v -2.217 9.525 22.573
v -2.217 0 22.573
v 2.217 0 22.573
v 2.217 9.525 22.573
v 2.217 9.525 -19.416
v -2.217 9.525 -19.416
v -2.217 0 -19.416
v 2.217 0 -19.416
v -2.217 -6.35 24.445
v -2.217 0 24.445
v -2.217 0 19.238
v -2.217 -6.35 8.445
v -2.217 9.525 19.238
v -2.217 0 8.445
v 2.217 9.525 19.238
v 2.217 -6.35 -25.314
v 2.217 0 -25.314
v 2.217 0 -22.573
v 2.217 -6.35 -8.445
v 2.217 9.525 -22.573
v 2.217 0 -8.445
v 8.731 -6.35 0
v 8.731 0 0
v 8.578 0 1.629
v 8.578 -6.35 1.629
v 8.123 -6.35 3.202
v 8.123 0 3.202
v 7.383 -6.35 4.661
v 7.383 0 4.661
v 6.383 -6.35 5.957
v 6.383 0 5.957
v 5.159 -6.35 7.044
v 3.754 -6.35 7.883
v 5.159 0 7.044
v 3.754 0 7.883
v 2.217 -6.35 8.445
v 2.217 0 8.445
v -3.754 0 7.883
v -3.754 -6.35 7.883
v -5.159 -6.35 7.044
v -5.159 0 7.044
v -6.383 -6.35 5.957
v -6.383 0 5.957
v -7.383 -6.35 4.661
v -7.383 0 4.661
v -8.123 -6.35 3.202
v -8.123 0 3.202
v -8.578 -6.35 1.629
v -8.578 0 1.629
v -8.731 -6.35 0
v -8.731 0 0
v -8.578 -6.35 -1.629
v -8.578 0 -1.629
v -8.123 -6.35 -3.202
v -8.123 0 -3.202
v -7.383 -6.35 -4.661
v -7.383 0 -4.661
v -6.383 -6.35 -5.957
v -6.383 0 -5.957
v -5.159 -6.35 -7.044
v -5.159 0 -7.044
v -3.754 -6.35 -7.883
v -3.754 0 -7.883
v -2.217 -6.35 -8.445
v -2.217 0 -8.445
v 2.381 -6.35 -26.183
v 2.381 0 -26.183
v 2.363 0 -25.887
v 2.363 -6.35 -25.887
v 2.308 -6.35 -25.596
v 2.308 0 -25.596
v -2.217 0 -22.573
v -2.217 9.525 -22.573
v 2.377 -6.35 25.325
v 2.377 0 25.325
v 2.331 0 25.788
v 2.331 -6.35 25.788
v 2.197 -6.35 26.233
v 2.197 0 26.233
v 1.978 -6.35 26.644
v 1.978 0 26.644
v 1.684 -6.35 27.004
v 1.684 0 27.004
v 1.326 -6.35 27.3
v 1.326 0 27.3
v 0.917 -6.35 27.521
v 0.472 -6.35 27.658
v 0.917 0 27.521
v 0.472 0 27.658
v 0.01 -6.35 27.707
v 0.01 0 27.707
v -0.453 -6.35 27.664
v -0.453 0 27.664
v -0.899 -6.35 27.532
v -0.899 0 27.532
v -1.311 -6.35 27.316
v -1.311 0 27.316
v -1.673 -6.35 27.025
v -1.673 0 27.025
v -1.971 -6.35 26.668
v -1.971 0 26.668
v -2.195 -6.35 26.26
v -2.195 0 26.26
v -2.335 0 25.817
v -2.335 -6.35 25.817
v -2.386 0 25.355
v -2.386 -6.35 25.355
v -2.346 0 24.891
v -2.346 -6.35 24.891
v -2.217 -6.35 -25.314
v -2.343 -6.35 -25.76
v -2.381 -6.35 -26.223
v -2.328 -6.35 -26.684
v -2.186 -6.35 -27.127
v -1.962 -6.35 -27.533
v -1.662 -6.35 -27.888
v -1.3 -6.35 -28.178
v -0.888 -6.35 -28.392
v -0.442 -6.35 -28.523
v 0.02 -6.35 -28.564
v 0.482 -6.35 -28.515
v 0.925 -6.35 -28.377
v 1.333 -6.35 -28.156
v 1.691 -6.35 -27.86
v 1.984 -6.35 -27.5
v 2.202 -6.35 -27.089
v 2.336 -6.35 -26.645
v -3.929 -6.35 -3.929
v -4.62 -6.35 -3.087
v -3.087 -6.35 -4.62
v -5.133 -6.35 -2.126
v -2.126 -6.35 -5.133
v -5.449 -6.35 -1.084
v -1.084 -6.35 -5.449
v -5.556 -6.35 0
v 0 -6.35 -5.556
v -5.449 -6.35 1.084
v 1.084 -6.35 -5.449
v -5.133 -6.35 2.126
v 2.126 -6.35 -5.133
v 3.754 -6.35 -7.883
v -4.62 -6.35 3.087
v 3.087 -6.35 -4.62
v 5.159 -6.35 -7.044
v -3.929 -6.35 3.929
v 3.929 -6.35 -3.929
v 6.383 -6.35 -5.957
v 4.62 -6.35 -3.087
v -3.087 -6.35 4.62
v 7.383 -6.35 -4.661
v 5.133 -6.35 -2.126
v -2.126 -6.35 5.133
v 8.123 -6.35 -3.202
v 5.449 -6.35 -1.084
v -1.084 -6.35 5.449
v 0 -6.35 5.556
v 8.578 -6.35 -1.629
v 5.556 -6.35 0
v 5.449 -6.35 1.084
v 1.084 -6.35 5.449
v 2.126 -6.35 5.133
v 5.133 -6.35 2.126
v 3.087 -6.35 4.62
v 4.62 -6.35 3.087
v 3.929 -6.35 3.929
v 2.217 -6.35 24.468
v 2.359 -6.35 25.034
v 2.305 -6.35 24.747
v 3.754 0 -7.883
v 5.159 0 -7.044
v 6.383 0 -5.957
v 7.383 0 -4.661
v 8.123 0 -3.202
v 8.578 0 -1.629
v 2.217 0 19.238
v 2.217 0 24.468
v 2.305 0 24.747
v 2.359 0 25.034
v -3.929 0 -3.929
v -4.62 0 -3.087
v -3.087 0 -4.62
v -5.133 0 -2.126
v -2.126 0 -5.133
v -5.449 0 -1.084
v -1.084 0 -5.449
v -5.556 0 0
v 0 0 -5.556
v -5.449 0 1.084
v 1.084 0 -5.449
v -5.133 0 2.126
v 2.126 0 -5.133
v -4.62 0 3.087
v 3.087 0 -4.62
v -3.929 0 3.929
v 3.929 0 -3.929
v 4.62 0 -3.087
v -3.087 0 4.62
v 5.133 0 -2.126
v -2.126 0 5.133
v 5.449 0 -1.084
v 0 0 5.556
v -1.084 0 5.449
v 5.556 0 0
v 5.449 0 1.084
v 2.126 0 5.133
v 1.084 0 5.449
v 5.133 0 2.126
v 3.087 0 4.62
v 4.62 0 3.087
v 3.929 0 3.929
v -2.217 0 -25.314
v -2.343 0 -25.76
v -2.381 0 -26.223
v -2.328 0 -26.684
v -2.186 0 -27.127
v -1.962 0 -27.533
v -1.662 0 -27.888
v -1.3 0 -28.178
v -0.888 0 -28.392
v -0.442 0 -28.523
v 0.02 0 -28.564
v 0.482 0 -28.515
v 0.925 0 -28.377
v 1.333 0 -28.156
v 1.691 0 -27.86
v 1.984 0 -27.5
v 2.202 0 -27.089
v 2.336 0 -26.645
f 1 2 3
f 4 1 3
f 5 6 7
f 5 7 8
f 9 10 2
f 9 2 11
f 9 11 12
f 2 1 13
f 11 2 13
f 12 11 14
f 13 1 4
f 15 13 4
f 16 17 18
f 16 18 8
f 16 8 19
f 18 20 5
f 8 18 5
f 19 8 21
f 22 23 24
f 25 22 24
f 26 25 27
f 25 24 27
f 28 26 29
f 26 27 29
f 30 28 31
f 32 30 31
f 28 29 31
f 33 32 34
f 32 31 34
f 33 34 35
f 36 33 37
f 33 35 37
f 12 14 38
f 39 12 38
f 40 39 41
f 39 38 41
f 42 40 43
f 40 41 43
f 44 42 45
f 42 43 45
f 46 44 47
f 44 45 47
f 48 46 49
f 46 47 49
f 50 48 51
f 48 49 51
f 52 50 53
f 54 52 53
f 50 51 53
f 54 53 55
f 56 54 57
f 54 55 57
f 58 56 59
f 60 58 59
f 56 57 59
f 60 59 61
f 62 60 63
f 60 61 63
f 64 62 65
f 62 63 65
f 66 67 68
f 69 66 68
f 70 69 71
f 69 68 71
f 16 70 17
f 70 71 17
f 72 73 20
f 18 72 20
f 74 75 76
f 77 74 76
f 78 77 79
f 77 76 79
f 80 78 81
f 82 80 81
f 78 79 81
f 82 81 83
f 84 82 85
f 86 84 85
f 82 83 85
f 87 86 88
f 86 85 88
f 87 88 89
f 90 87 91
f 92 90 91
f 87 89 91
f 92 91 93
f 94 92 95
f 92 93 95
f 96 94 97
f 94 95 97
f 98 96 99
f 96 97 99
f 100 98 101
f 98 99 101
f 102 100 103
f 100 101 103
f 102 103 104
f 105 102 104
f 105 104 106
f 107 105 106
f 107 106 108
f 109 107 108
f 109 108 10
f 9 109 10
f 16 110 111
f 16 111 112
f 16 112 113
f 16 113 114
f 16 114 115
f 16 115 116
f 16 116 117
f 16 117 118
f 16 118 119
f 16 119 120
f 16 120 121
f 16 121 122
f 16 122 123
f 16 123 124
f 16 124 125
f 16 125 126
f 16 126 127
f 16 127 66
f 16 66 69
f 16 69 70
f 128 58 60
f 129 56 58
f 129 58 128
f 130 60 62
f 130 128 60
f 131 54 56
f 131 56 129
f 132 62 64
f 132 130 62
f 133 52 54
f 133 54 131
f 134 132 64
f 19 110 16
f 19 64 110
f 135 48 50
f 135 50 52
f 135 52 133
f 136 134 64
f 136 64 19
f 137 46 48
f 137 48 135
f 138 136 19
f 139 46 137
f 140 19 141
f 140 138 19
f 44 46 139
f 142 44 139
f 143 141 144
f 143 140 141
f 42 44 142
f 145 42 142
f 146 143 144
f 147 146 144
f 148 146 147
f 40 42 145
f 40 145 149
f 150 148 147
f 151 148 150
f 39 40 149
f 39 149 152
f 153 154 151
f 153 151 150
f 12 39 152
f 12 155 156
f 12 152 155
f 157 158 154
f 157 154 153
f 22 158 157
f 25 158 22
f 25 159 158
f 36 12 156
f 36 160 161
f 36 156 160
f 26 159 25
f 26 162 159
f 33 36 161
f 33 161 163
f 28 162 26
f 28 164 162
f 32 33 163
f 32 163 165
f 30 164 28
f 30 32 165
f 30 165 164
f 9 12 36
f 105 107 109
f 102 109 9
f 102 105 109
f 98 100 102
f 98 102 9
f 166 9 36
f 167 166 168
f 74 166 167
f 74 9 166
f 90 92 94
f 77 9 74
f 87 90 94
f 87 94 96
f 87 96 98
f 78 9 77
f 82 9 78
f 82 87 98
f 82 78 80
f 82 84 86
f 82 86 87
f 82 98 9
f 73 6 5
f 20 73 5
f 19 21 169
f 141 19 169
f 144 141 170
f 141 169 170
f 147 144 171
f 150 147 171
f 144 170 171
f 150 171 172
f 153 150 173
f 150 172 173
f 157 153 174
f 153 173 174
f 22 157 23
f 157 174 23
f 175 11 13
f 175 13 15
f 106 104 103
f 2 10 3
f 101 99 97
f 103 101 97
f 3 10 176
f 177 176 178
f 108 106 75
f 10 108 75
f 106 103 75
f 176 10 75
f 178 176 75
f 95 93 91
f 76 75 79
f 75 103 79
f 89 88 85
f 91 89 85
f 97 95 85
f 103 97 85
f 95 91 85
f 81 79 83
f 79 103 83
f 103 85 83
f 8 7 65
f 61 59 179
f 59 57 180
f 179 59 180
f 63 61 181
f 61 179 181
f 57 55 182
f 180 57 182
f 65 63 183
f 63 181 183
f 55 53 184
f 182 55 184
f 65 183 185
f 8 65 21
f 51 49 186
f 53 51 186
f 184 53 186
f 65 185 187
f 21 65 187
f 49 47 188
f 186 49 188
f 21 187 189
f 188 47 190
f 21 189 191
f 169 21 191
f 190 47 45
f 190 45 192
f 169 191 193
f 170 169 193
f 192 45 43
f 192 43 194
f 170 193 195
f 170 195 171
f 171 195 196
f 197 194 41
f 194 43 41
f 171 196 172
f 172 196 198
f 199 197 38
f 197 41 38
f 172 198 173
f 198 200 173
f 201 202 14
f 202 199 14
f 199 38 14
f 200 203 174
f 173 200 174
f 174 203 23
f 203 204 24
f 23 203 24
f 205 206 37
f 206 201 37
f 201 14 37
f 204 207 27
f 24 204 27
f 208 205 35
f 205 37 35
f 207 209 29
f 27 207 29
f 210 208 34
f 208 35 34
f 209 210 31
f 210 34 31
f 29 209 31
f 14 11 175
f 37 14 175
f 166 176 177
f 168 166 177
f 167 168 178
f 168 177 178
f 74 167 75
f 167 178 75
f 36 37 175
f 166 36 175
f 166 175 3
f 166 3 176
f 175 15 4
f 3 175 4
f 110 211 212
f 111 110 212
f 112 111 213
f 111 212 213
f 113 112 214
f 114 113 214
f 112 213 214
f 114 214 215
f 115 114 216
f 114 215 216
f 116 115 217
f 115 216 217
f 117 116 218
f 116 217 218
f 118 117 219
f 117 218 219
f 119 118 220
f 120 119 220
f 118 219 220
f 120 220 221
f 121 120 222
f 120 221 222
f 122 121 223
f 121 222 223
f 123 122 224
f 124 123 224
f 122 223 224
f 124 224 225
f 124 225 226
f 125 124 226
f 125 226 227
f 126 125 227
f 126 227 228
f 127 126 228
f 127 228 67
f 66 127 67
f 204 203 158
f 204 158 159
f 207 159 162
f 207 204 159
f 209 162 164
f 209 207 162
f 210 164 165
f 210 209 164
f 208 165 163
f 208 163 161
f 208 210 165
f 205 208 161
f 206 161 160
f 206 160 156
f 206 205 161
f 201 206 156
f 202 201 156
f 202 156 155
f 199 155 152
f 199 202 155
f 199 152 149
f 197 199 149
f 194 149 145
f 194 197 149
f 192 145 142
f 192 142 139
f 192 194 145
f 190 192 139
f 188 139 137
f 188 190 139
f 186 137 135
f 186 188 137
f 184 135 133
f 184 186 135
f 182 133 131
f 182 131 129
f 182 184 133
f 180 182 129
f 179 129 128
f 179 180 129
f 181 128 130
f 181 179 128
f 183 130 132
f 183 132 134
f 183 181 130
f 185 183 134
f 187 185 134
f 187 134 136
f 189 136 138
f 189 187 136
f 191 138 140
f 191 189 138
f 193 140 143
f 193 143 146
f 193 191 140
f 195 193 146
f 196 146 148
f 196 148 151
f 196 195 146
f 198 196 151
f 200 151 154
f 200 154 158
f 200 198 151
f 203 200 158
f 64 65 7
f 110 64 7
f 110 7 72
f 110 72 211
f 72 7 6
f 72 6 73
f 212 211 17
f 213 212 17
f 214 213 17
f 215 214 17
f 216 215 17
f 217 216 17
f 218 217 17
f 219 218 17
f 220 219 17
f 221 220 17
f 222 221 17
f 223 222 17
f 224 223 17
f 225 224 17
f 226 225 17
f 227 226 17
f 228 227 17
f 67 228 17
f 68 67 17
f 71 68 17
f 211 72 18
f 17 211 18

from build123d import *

# Parameters (mm, degrees)
F0_R     = 5.55625
F0_W     = 4.4338748
F0_H     = 3.3354461193
F0_W_2   = 4.4338805894
F0_H_2   = 3.1579534903
F1_DEPTH = 6.35
F2_DEPTH = 9.525


with BuildPart() as f1:
    # F0 (on Front) → F1 (new body)
    with BuildSketch(Plane.XZ):
        with BuildLine():
            ThreePointArc((2.2169431894, -8.4451103875), (6.9134438518, -5.3328248302), (8.73125, 0))
            ThreePointArc((8.73125, 0), (6.9134420239, 5.3328271999), (2.2169374, 8.4451119073))
            ThreePointArc((2.2169374, 8.4451119073), (0, 8.73125), (-2.2169374, 8.4451119073))
            ThreePointArc((-2.2169374, 8.4451119073), (-8.73125, 0), (-2.2169374, -8.4451119073))
            ThreePointArc((-2.2169374, -8.4451119073), (2.9928e-06, -8.73125), (2.2169431894, -8.4451103875))
        make_face()
        Circle(F0_R, mode=Mode.SUBTRACT)
        with BuildLine():
            ThreePointArc((-2.2169374, 8.4451119073), (0, 8.73125), (2.2169374, 8.4451119073))
            Line((2.2169374, 8.4451119073), (2.2169374, 19.2380044443))
            Line((2.2169374, 19.2380044443), (-2.2169374, 19.2380044443))
            Line((-2.2169374, 19.2380044443), (-2.2169374, 8.4451119073))
        make_face()
        with Locations((0, 20.9057275039)):
            Rectangle(F0_W, F0_H)
        with BuildLine():
            Line((-2.2169374, 22.5734505636), (2.2169374, 22.5734505636))
            Line((2.2169374, 22.5734505636), (2.2169374, 24.4680076557))
            ThreePointArc((2.2169374, 24.4680076557), (0.0079970052, 22.9441930949), (-2.2169374, 24.444558176))
            Line((-2.2169374, 24.444558176), (-2.2169374, 22.5734505636))
        make_face()
        with BuildLine():
            ThreePointArc((-2.2169374, 24.444558176), (0.0079970052, 22.9441930949), (2.2169374, 24.4680076557))
            ThreePointArc((2.2169374, 24.4680076557), (2.3363839293, 24.8893342153), (2.3766534396, 25.3254097933))
            ThreePointArc((2.3766534396, 25.3254097933), (-0.4530466345, 27.6640512993), (-2.2169374, 24.444558176))
        make_face()
        with BuildLine():
            ThreePointArc((2.38125, -26.1828773278), (2.3398127631, -25.7405790163), (2.2169431894, -25.3136739814))
            ThreePointArc((2.2169431894, -25.3136739814), (7.9302e-06, -23.8016273278), (-2.2169374, -25.3136592154))
            ThreePointArc((-2.2169374, -25.3136592154), (-0.4423061037, -28.5226886179), (2.38125, -26.1828773278))
        make_face()
        with BuildLine():
            Line((2.2169431894, -19.4155004973), (2.2169431894, -8.4451103875))
            ThreePointArc((2.2169431894, -8.4451103875), (2.9928e-06, -8.73125), (-2.2169374, -8.4451119073))
            Line((-2.2169374, -8.4451119073), (-2.2169374, -19.4155004973))
            Line((-2.2169374, -19.4155004973), (2.2169431894, -19.4155004973))
        make_face()
        with Locations((2.8947e-06, -20.9944772424)):
            Rectangle(F0_W_2, F0_H_2)
        with BuildLine():
            Line((2.2169431894, -25.3136739814), (2.2169431894, -22.5734539875))
            Line((2.2169431894, -22.5734539875), (-2.2169374, -22.5734539875))
            Line((-2.2169374, -22.5734539875), (-2.2169374, -25.3136592154))
            ThreePointArc((-2.2169374, -25.3136592154), (7.9302e-06, -23.8016273278), (2.2169431894, -25.3136739814))
        make_face()
    extrude(amount=F1_DEPTH)

    # F0 (on Front) → F2 (join)
    with BuildSketch(Plane.XZ):
        with Locations((0, 20.9057275039)):
            Rectangle(F0_W, F0_H)
        with Locations((2.8947e-06, -20.9944772424)):
            Rectangle(F0_W_2, F0_H_2)
    extrude(amount=-F2_DEPTH)


solid = f1.part
